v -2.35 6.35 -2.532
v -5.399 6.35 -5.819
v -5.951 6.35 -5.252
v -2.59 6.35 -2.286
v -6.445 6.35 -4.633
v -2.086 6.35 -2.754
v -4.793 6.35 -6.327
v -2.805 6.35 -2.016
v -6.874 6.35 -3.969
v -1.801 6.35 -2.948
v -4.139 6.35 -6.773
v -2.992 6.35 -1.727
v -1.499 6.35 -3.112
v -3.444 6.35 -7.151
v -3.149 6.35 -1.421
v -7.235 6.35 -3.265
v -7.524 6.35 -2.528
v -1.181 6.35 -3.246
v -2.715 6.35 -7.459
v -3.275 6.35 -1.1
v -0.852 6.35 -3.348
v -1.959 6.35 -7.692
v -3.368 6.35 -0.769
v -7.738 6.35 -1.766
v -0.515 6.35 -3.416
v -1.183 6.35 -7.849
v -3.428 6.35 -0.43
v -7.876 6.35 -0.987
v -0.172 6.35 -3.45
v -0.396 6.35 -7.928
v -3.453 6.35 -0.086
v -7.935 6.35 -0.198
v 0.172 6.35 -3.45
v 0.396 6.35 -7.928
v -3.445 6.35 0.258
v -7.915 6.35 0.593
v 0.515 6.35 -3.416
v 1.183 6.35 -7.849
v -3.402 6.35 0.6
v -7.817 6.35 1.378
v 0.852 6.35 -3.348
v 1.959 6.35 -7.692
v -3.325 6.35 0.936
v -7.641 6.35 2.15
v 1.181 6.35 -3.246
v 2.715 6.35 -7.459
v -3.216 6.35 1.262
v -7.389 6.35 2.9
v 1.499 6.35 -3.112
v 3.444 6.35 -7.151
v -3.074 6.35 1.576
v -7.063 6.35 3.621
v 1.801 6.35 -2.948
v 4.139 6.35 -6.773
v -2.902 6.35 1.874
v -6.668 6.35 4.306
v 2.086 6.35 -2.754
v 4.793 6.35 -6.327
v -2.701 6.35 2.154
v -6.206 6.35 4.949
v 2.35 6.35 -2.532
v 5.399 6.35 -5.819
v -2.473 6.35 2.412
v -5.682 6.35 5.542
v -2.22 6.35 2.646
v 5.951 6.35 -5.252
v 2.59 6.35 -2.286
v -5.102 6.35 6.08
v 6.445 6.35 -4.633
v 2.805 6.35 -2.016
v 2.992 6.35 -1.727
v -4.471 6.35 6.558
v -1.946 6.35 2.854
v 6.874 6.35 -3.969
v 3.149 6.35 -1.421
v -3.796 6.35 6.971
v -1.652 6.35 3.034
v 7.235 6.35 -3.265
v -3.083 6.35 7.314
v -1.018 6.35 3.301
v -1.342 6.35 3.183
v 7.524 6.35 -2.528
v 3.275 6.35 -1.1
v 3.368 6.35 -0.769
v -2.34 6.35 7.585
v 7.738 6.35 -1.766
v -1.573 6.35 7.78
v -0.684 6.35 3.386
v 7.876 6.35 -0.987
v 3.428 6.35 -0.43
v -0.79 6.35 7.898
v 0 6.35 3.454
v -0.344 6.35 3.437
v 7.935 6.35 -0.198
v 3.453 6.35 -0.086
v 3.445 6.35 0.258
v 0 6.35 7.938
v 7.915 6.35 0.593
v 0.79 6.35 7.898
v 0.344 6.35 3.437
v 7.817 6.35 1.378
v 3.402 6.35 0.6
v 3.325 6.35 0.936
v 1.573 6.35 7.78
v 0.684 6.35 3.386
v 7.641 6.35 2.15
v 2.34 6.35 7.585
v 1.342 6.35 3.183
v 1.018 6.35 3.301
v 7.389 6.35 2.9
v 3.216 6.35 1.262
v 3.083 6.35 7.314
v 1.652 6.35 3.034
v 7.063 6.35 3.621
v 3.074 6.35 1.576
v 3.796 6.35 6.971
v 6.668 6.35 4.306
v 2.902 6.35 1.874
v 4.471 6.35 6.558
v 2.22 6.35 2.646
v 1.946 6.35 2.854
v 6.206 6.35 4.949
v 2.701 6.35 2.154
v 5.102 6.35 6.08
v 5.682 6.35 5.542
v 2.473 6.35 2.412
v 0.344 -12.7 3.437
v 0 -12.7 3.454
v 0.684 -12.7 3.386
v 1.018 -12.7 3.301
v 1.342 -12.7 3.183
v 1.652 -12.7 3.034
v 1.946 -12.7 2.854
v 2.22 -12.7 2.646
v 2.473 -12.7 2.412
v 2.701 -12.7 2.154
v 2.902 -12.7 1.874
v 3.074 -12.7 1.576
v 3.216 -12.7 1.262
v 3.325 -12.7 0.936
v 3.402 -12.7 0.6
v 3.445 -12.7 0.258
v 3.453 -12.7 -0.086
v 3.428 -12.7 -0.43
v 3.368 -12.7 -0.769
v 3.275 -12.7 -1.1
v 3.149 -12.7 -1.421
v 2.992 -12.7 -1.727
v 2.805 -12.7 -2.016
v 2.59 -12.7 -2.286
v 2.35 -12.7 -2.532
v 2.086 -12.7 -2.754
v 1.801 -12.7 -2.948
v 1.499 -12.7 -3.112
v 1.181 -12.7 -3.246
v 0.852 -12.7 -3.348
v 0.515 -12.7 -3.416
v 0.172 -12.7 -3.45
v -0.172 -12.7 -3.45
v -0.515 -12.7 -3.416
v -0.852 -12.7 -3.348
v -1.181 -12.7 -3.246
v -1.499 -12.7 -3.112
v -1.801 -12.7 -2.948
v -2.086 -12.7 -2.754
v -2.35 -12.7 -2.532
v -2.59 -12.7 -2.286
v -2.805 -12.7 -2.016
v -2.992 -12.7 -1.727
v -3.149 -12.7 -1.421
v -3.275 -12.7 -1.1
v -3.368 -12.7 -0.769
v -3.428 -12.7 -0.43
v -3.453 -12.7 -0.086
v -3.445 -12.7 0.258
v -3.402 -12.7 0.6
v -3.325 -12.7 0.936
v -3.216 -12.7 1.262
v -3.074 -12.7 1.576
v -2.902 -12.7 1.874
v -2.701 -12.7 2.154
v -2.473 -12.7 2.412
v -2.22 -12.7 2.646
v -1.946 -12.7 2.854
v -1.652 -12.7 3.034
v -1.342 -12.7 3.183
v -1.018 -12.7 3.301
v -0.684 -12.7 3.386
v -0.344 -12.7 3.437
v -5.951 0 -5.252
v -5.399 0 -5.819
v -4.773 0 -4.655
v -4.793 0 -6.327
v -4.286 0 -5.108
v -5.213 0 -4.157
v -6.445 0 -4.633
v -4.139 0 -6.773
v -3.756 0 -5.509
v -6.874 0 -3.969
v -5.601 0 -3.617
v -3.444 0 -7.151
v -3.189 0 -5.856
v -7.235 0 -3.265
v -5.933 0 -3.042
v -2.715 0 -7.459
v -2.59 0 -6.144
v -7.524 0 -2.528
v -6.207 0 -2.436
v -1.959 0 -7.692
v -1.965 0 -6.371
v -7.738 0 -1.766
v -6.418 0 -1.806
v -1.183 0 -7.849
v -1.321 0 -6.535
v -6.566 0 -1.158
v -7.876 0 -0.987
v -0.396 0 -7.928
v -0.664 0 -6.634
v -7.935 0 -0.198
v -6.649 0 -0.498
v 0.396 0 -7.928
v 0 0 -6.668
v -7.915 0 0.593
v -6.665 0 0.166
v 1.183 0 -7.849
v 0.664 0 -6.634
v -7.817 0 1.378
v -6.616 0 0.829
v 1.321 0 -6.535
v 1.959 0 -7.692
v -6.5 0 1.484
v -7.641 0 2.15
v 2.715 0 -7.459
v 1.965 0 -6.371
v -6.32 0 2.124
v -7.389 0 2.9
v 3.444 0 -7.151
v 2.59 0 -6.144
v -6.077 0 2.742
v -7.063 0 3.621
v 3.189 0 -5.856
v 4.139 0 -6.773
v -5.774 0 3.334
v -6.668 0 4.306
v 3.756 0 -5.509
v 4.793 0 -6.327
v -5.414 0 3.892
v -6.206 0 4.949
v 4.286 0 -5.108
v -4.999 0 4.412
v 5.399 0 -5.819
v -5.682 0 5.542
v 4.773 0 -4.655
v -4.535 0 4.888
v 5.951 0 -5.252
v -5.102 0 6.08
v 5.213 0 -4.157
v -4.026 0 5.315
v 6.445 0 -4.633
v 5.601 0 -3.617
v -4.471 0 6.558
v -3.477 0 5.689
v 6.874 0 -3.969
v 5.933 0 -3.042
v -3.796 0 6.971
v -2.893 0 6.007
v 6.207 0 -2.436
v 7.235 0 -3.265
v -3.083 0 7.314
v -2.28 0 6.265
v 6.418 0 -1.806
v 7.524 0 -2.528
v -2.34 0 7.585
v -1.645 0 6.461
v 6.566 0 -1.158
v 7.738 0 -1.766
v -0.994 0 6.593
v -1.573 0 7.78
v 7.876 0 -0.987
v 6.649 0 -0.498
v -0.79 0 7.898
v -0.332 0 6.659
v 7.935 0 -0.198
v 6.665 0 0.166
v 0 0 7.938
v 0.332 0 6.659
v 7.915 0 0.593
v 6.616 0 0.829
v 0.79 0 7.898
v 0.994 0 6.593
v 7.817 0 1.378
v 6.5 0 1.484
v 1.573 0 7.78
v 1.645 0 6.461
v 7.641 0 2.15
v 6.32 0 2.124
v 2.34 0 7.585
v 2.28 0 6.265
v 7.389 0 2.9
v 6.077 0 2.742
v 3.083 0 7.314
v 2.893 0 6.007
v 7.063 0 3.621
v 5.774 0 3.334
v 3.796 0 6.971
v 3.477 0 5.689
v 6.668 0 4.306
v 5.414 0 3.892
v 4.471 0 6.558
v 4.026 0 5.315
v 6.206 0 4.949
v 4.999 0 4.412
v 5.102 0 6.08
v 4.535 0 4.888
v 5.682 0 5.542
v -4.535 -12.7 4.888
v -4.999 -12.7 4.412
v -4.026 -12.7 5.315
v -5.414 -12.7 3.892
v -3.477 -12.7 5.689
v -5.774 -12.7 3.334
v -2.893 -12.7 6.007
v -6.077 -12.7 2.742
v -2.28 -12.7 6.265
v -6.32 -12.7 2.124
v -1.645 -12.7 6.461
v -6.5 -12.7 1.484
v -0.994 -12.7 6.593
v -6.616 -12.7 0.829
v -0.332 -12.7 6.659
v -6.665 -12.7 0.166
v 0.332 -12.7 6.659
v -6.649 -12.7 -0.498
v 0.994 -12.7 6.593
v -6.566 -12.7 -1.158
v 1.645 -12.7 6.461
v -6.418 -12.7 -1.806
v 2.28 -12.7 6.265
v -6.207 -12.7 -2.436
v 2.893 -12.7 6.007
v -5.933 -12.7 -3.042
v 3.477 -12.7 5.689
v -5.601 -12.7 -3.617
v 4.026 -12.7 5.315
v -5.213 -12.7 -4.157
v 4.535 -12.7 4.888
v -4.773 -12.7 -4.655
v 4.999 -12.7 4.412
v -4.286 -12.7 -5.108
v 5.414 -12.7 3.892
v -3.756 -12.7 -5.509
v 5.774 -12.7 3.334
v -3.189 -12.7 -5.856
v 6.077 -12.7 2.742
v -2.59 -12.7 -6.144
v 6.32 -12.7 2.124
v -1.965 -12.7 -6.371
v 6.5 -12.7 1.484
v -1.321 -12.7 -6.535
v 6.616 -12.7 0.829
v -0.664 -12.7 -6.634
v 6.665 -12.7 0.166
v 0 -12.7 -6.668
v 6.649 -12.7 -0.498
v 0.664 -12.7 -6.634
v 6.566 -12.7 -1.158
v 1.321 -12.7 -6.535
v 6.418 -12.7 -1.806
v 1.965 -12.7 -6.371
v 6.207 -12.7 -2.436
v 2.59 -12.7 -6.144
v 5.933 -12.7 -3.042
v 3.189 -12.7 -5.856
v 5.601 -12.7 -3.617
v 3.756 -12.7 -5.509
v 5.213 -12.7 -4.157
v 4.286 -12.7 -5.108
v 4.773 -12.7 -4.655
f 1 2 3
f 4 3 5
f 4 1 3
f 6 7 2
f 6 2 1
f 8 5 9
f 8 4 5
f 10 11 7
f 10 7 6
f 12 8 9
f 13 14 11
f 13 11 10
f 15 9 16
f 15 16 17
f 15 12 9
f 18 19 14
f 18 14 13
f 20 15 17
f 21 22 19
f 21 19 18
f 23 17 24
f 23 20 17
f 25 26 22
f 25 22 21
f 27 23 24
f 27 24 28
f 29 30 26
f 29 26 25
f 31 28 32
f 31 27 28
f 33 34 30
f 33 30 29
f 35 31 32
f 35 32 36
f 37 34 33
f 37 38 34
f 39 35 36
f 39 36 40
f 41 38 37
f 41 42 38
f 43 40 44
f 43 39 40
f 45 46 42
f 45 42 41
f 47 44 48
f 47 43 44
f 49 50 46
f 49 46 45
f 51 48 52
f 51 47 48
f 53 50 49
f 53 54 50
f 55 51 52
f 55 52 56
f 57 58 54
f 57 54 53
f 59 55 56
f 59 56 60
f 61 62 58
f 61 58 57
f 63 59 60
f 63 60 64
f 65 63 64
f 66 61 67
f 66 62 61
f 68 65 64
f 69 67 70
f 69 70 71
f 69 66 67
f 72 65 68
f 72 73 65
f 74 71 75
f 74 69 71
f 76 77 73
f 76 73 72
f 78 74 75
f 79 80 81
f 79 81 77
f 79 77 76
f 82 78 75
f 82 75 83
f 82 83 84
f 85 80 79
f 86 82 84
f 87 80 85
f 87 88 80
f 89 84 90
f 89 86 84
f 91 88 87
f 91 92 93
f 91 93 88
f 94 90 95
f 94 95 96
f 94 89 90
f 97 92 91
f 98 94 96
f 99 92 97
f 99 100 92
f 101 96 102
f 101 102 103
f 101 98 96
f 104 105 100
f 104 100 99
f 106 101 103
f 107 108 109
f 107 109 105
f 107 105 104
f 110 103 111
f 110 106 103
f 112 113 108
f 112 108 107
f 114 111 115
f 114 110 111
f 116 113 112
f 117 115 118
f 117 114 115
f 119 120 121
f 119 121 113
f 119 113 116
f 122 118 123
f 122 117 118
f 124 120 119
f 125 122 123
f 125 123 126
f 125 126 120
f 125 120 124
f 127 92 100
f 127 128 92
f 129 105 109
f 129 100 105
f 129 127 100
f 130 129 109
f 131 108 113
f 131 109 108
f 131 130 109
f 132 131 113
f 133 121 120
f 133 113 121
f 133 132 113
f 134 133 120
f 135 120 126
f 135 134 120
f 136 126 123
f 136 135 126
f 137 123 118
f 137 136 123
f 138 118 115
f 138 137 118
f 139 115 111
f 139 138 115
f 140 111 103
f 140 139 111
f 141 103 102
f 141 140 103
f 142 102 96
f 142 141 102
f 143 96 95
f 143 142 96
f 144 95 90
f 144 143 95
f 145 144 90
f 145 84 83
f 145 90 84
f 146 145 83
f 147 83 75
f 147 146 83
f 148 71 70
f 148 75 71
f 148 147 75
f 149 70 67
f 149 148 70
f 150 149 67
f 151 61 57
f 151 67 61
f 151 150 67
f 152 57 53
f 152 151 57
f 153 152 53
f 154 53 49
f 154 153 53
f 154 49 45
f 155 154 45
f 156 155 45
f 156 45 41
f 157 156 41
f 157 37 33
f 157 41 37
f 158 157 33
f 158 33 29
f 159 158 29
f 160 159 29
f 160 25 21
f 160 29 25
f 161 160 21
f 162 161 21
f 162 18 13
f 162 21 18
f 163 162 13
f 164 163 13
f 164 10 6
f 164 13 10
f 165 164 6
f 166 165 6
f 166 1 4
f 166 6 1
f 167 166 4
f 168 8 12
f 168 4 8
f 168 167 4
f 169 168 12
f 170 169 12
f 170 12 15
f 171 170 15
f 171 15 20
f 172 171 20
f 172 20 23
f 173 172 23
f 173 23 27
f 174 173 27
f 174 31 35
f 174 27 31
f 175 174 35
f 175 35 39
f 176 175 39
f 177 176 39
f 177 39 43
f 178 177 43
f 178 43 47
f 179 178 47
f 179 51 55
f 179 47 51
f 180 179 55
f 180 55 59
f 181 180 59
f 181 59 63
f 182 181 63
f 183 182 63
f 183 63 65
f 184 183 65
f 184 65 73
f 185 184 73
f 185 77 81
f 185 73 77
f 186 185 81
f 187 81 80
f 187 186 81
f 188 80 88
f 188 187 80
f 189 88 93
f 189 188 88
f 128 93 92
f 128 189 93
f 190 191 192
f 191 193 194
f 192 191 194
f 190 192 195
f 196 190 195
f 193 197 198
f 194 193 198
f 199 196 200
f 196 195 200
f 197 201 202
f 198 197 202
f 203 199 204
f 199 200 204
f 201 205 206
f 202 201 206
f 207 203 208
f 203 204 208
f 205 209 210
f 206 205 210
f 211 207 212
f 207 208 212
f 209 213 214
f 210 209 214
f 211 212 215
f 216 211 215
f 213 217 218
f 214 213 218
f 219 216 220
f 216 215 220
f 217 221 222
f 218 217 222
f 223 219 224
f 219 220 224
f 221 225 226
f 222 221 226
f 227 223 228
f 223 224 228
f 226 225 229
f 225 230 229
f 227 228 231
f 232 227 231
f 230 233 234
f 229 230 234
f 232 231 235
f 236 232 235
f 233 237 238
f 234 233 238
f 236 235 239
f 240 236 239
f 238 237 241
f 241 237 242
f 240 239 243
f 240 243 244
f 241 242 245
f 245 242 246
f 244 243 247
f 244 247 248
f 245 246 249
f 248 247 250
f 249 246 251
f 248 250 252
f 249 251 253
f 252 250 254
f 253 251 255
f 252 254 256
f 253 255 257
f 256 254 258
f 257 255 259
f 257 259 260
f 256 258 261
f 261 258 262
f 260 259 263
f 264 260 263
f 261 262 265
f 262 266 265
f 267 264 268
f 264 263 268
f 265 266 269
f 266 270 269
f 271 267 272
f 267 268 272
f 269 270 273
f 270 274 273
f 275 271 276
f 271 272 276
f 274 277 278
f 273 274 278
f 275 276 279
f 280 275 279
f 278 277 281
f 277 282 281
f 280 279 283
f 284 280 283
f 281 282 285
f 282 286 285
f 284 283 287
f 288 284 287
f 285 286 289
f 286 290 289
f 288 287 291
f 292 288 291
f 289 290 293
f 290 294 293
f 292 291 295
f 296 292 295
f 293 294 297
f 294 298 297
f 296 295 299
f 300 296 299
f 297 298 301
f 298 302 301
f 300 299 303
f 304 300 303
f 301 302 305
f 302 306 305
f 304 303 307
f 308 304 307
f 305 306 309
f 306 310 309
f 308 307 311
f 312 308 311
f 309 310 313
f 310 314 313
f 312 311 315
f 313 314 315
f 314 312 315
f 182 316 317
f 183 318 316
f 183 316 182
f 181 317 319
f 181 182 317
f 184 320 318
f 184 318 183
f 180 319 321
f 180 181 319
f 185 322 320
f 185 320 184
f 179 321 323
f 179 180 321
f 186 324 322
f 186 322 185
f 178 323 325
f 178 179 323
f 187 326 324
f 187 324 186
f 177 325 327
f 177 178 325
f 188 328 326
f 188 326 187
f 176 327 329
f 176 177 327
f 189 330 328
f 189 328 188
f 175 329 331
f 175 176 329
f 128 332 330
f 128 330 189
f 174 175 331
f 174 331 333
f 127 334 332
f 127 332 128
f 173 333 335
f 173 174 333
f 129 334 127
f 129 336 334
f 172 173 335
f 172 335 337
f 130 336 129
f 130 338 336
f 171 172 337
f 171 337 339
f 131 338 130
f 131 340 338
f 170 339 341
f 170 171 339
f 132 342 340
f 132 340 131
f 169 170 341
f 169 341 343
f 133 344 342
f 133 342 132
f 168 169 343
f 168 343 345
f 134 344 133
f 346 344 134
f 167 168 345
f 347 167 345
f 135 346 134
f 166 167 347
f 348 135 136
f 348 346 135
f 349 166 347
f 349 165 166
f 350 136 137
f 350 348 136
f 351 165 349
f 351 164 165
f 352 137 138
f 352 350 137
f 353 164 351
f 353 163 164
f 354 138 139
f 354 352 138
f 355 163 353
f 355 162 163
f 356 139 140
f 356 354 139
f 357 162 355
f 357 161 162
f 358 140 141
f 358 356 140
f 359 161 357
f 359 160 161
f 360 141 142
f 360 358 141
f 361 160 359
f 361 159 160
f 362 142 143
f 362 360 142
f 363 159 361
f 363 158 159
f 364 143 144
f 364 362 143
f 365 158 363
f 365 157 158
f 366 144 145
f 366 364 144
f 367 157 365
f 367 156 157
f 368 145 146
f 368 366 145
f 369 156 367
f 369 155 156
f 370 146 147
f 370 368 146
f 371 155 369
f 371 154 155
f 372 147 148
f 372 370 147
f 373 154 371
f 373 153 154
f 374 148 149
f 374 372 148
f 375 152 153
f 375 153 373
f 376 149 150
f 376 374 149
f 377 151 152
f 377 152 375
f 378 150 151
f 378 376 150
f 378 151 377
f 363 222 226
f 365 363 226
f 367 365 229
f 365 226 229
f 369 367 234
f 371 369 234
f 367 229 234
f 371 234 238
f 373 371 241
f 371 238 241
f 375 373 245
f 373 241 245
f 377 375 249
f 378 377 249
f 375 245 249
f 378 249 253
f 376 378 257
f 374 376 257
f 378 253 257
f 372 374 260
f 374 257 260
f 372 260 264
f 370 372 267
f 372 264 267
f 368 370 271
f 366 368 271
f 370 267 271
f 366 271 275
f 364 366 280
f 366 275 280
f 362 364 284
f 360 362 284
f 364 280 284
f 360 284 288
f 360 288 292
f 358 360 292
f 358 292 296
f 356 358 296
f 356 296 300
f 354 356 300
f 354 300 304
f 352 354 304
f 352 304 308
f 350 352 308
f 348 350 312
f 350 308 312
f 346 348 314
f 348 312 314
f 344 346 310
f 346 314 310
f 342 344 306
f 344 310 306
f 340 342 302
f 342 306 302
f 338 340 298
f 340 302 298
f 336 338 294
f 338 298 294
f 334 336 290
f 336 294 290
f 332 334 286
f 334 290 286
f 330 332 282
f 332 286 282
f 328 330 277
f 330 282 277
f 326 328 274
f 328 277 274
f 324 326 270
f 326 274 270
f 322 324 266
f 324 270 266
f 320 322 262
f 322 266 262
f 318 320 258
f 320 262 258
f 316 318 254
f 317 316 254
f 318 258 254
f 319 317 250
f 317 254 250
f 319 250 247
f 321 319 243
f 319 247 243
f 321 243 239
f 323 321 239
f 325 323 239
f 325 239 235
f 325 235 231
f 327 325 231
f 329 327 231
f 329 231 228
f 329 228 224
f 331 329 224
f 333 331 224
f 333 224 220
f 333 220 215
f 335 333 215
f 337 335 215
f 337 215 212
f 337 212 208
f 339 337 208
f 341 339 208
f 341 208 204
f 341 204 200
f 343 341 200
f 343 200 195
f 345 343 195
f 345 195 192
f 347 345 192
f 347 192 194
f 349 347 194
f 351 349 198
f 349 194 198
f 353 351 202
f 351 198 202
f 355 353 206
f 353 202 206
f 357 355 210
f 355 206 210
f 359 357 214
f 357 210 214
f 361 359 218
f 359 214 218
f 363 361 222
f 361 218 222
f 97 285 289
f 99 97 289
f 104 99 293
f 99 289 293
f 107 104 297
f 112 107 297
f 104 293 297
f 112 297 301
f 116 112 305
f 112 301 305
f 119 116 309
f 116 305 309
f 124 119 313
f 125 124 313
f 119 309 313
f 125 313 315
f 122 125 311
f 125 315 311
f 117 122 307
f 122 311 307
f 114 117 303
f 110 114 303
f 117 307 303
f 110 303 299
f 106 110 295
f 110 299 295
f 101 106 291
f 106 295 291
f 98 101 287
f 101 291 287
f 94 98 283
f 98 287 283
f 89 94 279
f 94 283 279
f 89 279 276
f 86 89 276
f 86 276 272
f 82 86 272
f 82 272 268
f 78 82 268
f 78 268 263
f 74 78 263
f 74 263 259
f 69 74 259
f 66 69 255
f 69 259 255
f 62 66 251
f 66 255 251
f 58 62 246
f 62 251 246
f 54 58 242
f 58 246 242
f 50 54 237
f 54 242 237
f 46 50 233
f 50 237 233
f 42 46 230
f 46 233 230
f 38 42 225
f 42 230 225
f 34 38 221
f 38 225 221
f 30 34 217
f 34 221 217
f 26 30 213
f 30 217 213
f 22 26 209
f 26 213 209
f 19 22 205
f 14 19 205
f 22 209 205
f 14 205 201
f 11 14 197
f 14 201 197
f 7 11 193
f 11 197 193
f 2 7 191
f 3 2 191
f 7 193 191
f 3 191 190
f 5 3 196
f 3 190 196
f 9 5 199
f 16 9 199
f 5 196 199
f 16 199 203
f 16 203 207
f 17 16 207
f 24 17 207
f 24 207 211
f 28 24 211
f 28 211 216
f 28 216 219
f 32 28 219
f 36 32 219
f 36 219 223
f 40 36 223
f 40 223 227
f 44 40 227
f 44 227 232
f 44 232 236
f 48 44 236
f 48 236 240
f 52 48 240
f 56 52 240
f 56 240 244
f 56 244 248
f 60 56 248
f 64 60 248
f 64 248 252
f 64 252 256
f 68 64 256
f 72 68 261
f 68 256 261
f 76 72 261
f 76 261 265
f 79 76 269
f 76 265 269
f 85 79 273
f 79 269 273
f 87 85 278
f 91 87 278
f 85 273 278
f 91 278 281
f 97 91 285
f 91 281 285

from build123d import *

# Parameters (mm, degrees)
SKETCH1_R               = 7.9375
BOSS_EXTRUDE1_DEPTH     = 6.35
SKETCH2_R               = 6.6675
BOSS_EXTRUDE2_DEPTH     = 12.7
CUT_EXTRUDE1_DEPTH      = 23.11131639
CUT_EXTRUDE1_DEPTH_BACK = 23.11131639
SKETCH5_R               = 3.4544


with BuildPart() as part:
    # Sketch1 → Boss-Extrude1 (new body)
    with BuildSketch(Plane(origin=(0, 0, 0), x_dir=(1, 0, 0), z_dir=(0, 1, 0))):
        with Locations(Location((0, 0, 0), (0, 0, 270))):
            Circle(SKETCH1_R)
    extrude(amount=BOSS_EXTRUDE1_DEPTH)

    # Sketch2 → Boss-Extrude2 (add)
    with BuildSketch(Plane.XZ):
        with Locations(Location((0, 0, 0), (0, 0, 270))):
            Circle(SKETCH2_R)
    extrude(amount=BOSS_EXTRUDE2_DEPTH)

    # Sketch5 → Cut-Extrude1 (cut, two sides: drawn at the far end of the back side and taken through both)
    with BuildSketch(Plane(origin=(0, 6.35, 0), x_dir=(1, 0, 0), z_dir=(0, 1, 0)).offset(-CUT_EXTRUDE1_DEPTH_BACK)):
        with Locations(Location((0, 0, 0), (0, 0, 270))):
            Circle(SKETCH5_R)
    extrude(amount=CUT_EXTRUDE1_DEPTH + CUT_EXTRUDE1_DEPTH_BACK, mode=Mode.SUBTRACT)


solid = part.part
